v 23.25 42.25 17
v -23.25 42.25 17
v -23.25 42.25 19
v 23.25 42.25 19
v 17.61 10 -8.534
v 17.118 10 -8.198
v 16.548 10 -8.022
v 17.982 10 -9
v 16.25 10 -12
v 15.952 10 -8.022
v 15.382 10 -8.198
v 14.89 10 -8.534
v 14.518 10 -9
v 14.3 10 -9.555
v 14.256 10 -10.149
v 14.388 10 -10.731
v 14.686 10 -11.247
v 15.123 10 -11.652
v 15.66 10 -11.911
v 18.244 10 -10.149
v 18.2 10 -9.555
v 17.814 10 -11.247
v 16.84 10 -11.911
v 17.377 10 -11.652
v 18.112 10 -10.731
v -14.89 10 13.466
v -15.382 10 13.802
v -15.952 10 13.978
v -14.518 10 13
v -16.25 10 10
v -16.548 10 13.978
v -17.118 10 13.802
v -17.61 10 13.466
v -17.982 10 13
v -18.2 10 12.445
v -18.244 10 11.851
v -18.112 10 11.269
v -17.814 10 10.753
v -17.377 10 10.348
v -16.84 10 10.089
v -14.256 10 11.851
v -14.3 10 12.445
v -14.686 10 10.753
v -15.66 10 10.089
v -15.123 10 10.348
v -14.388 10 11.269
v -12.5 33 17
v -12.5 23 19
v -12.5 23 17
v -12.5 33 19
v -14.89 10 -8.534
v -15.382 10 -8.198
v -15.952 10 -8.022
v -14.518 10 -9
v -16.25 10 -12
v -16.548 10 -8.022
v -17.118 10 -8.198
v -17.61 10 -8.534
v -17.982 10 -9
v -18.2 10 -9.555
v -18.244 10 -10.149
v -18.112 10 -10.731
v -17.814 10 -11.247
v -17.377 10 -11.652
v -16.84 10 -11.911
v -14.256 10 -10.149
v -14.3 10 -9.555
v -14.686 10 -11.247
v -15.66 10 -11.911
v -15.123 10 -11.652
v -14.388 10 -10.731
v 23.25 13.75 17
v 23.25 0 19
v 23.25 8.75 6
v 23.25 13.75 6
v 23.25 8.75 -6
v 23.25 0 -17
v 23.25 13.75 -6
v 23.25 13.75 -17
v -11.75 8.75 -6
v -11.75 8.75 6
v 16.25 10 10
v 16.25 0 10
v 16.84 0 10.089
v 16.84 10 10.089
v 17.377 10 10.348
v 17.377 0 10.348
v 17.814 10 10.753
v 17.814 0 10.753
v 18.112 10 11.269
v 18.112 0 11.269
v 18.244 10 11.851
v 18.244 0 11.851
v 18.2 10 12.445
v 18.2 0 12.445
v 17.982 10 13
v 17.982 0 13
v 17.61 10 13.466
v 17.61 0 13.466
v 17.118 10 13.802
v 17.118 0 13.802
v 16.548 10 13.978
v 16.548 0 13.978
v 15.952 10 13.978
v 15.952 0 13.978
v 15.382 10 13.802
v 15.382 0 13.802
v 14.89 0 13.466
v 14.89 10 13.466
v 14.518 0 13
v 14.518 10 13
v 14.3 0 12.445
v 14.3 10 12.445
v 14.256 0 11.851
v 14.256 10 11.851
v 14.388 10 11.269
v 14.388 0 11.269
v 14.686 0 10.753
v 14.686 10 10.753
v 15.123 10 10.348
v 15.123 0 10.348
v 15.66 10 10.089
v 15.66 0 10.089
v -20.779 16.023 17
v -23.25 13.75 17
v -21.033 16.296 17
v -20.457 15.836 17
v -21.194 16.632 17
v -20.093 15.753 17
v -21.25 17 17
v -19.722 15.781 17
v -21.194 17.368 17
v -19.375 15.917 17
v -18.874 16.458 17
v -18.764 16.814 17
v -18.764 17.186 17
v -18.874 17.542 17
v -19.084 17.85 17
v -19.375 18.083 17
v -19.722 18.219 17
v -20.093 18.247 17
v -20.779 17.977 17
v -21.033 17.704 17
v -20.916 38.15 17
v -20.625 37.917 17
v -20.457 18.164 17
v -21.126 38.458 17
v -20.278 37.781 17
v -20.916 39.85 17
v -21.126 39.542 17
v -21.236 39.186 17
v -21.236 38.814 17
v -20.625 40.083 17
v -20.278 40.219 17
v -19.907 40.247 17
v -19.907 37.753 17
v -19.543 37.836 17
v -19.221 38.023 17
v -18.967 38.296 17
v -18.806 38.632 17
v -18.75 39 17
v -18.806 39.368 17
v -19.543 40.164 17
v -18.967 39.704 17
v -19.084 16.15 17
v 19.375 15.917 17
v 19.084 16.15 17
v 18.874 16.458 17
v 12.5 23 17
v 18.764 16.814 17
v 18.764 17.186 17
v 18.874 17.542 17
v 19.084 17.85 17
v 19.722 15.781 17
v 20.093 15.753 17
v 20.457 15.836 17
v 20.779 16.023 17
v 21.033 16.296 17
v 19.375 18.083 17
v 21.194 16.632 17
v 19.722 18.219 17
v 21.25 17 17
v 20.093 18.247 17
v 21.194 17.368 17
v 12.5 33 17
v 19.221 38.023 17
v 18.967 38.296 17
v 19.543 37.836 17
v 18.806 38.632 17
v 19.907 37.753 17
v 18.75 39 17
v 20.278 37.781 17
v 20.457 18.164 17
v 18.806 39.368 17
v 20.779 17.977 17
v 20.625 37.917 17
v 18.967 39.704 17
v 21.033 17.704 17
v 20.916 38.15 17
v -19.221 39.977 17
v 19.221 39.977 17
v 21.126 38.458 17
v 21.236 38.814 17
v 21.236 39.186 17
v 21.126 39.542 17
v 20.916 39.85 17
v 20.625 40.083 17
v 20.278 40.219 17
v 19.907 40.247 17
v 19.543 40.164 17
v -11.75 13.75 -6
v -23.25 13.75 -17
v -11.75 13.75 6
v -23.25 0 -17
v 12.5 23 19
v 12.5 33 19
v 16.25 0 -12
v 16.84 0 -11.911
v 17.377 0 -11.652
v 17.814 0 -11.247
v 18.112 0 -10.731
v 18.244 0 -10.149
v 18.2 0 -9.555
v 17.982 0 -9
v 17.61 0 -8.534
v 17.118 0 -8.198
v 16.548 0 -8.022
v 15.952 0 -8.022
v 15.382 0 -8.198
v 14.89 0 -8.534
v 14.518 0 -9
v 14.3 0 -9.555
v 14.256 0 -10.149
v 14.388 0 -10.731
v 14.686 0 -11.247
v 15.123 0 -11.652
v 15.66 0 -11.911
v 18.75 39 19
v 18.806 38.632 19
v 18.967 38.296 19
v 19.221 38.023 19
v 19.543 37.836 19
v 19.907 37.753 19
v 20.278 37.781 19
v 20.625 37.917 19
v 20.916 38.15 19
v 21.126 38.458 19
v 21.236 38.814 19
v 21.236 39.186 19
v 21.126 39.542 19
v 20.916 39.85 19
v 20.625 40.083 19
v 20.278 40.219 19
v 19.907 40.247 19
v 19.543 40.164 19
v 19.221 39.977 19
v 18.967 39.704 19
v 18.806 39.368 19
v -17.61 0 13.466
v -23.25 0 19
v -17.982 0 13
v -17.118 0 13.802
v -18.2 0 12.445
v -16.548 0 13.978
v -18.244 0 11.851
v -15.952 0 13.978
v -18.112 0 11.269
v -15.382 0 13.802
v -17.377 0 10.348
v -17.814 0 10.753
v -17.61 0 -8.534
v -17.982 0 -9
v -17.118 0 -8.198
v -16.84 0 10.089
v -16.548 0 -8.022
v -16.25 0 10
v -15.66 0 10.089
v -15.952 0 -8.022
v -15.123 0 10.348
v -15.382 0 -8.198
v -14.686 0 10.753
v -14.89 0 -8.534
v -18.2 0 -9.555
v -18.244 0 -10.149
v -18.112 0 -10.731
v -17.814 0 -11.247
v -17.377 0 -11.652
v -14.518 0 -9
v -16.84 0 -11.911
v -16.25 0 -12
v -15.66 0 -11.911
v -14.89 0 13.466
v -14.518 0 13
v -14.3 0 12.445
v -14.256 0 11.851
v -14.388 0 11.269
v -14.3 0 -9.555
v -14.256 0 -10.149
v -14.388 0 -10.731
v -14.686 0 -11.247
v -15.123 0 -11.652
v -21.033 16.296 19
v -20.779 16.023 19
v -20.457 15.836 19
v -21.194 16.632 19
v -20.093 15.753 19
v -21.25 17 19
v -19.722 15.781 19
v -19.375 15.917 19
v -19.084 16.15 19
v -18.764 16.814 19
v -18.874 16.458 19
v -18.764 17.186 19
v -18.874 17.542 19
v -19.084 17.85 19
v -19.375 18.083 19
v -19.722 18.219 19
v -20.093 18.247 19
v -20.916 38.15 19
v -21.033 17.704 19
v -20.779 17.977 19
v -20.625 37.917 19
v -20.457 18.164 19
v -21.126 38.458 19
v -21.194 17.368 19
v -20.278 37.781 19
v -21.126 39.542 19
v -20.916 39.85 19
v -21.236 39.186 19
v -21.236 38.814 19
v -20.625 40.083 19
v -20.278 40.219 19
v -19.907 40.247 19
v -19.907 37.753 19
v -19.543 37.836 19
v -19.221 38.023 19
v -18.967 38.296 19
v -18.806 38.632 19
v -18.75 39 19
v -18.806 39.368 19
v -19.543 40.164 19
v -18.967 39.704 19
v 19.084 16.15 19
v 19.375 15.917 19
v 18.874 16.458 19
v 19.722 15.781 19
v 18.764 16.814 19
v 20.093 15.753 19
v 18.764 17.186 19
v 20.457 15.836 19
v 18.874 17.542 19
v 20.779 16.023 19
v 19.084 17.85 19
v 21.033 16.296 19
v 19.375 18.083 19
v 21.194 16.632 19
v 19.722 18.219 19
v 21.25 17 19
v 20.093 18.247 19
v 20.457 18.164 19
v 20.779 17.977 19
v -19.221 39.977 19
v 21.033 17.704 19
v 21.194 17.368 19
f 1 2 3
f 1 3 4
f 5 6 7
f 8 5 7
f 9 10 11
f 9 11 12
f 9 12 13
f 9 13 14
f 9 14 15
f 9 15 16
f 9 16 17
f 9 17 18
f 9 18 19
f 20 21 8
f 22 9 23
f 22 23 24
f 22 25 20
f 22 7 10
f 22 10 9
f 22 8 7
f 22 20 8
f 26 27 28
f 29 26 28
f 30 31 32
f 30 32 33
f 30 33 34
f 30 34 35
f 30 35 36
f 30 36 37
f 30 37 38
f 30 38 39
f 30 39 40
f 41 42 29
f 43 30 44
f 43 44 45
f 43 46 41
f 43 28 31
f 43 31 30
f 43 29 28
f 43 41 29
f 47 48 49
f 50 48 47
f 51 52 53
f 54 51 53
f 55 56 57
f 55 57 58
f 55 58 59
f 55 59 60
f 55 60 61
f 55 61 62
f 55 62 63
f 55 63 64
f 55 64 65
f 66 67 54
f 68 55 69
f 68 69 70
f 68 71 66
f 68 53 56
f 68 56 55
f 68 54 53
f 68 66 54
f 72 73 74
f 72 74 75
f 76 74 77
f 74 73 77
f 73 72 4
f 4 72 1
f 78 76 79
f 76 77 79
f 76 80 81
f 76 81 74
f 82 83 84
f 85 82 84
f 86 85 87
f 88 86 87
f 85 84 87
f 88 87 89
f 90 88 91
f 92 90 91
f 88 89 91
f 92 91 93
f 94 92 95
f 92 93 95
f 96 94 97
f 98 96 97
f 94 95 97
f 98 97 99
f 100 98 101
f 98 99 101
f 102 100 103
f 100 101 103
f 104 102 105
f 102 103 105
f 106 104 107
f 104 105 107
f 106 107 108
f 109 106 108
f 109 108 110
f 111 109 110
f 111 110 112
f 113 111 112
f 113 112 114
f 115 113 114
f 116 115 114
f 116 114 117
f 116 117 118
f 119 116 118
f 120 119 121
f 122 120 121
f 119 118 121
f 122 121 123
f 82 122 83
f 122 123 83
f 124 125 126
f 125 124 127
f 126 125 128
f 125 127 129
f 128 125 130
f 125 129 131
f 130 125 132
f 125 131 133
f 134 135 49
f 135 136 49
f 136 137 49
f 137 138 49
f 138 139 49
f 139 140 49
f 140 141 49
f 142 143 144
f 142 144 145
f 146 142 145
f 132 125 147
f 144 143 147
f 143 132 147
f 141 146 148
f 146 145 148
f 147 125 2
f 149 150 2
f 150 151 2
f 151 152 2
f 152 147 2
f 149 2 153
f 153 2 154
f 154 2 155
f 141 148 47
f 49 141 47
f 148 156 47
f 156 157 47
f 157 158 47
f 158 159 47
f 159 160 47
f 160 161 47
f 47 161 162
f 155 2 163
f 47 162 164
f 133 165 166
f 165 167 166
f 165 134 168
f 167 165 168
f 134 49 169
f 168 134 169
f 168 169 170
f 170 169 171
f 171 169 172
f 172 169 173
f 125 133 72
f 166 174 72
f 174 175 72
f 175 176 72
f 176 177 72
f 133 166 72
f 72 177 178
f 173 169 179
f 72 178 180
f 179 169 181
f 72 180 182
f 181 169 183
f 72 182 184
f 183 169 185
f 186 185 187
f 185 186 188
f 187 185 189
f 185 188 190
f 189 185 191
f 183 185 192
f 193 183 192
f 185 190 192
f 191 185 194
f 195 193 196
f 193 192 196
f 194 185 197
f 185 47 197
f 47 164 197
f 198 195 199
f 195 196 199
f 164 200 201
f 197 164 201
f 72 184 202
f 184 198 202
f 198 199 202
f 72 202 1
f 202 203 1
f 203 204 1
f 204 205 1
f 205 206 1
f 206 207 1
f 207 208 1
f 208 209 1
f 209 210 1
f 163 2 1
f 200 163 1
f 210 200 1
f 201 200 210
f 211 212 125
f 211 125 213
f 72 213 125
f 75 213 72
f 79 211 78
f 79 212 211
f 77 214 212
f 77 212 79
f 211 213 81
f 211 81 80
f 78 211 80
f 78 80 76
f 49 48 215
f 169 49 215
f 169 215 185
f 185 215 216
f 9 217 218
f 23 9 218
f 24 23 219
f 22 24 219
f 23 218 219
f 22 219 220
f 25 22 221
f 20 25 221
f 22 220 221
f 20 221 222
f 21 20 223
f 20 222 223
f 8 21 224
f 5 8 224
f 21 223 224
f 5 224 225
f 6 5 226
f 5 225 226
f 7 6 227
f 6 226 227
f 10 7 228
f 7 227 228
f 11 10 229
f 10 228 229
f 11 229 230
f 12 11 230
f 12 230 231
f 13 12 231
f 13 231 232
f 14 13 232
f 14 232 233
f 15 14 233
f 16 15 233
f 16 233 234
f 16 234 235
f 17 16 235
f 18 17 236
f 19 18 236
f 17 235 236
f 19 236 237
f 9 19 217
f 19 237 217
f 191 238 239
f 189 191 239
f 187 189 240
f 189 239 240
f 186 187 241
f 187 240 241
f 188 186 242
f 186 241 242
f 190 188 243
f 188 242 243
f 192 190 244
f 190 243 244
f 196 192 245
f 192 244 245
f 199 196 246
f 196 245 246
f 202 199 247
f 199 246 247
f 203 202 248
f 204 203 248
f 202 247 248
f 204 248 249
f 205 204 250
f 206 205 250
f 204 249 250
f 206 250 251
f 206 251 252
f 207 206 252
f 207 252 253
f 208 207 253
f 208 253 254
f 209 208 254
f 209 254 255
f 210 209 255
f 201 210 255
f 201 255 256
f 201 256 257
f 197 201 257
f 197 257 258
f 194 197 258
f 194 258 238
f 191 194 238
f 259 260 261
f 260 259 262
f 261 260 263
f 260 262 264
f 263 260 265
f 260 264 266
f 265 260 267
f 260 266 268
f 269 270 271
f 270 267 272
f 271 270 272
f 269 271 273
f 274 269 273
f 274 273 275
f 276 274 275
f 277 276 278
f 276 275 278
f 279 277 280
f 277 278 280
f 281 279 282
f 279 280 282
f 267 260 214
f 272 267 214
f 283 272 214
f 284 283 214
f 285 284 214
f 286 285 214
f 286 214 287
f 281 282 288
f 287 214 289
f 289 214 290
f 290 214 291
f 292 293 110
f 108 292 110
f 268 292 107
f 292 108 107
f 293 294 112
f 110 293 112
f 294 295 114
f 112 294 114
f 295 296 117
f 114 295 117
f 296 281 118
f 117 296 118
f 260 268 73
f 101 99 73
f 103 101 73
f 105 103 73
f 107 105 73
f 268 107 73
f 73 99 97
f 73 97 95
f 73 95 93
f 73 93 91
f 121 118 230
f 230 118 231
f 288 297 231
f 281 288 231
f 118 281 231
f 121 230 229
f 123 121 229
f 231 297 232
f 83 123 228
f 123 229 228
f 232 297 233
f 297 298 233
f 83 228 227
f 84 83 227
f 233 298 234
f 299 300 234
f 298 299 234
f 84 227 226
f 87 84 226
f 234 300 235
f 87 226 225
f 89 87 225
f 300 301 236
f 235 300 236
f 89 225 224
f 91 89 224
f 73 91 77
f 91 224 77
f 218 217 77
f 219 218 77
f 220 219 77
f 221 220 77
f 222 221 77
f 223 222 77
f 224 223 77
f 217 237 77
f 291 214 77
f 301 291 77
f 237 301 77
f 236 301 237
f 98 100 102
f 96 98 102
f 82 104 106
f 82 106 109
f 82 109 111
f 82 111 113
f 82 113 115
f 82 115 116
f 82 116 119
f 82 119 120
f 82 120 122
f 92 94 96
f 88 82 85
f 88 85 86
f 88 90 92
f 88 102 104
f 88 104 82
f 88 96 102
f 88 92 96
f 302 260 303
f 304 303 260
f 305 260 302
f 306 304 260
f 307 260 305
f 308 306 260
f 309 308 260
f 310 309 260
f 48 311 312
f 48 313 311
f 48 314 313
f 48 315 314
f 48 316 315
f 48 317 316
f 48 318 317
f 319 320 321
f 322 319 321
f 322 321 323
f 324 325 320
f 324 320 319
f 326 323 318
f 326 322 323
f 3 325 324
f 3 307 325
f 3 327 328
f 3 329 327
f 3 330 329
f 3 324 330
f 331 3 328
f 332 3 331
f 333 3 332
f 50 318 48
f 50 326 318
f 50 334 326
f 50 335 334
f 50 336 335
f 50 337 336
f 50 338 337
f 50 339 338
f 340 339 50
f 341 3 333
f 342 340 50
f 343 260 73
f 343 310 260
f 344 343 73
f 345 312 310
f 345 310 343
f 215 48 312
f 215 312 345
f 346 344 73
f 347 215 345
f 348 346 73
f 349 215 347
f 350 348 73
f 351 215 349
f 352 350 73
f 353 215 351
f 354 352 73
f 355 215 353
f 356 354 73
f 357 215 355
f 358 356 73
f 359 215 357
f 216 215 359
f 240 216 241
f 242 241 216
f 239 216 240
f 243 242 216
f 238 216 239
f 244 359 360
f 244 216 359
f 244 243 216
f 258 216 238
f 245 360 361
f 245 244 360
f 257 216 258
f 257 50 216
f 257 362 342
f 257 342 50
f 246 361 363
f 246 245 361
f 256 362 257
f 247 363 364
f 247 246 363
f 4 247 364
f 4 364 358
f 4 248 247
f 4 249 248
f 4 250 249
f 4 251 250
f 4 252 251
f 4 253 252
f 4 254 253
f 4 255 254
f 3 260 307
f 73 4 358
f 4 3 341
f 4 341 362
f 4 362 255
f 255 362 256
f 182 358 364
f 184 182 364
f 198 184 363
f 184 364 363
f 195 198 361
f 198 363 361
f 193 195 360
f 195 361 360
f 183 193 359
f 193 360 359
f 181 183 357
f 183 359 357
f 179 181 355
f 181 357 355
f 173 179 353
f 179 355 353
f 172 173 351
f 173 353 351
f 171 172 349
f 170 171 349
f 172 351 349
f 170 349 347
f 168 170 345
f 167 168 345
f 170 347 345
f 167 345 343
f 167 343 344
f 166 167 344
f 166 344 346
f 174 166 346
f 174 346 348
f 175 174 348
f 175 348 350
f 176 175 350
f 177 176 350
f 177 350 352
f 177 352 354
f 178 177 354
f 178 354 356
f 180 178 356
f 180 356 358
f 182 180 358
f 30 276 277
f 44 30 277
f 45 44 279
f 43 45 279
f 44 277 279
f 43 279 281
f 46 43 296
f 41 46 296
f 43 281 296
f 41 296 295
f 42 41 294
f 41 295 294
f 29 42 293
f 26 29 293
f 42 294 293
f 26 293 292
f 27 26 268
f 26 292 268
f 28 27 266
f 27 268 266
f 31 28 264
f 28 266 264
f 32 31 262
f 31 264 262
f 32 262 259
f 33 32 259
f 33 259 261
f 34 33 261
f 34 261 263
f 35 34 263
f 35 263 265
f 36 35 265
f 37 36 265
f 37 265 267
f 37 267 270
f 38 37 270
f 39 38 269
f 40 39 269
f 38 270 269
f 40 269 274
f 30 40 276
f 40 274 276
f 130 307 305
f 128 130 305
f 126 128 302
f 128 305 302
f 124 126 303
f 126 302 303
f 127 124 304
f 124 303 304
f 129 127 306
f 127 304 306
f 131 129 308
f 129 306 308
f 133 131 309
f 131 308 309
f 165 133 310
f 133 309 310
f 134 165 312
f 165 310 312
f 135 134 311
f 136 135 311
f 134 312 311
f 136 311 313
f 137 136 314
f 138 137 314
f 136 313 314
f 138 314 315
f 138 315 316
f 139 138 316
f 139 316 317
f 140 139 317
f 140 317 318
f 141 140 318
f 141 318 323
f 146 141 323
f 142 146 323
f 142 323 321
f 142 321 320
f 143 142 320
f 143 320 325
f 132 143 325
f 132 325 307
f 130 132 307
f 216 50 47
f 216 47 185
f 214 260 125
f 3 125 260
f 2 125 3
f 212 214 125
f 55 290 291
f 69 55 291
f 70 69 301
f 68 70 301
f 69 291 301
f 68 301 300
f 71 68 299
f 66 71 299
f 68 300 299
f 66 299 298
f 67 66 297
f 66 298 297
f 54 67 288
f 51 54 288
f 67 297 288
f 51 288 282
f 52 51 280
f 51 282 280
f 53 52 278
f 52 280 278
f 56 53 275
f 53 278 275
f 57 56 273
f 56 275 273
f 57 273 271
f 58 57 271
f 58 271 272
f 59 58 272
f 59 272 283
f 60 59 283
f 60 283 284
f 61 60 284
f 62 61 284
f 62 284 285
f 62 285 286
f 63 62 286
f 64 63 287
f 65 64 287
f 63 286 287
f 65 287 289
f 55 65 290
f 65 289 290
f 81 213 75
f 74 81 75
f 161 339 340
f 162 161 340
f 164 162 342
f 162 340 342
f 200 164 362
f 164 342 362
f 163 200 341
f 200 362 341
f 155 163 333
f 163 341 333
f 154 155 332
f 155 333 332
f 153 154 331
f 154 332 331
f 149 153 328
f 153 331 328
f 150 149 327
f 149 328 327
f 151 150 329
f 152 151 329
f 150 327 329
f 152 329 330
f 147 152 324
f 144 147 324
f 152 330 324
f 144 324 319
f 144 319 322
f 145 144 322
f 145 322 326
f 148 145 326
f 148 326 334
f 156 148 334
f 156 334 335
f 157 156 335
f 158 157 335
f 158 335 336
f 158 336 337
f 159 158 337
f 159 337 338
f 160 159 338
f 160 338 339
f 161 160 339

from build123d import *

# Parameters (mm, degrees)
SKETCH1_W           = 46.5
SKETCH1_H           = 34
BOSS_EXTRUDE1_DEPTH = 13.75
SKETCH2_W           = 46.5
SKETCH2_H           = 42.25
BOSS_EXTRUDE2_DEPTH = 2
CUT_EXTRUDE1_REACH  = 62.18
SKETCH3_R           = 1.25
SKETCH3_W           = 25
SKETCH3_H           = 10
SKETCH4_W           = 35
SKETCH4_H           = 12
CUT_EXTRUDE2_DEPTH  = 5
SKETCH6_R           = 2
CUT_EXTRUDE3_DEPTH  = 10


with BuildPart() as part:
    # Sketch1 → Boss-Extrude1 (new body)
    with BuildSketch(Plane(origin=(0, 0, 0), x_dir=(1, 0, 0), z_dir=(0, 1, 0))):
        Rectangle(SKETCH1_W, SKETCH1_H)
    extrude(amount=BOSS_EXTRUDE1_DEPTH)

    # Sketch2 → Boss-Extrude2 (add)
    with BuildSketch(Plane.XY.offset(17)):
        with Locations((0, 21.125)):
            Rectangle(SKETCH2_W, SKETCH2_H)
    extrude(amount=BOSS_EXTRUDE2_DEPTH)

    # Sketch3 → Cut-Extrude1 (cut, up to next)
    with BuildSketch(Plane.XY.offset(19), mode=Mode.PRIVATE) as cut_extrude1_sk1:
        with Locations((-20, 39)):
            Circle(SKETCH3_R)
    cut_extrude1_tool1 = extrude(cut_extrude1_sk1.sketch, amount=-CUT_EXTRUDE1_REACH, mode=Mode.PRIVATE) & part.part
    # Sketch3 → Cut-Extrude1 (cut, up to next)
    with BuildSketch(Plane.XY.offset(19), mode=Mode.PRIVATE) as cut_extrude1_sk2:
        with Locations(Location((20, 39, 0), (0, 0, 180))):
            Circle(SKETCH3_R)
    cut_extrude1_tool2 = extrude(cut_extrude1_sk2.sketch, amount=-CUT_EXTRUDE1_REACH, mode=Mode.PRIVATE) & part.part
    # Sketch3 → Cut-Extrude1 (cut, up to next)
    with BuildSketch(Plane.XY.offset(19), mode=Mode.PRIVATE) as cut_extrude1_sk3:
        with Locations((20, 17)):
            Circle(SKETCH3_R)
    cut_extrude1_tool3 = extrude(cut_extrude1_sk3.sketch, amount=-CUT_EXTRUDE1_REACH, mode=Mode.PRIVATE) & part.part
    # Sketch3 → Cut-Extrude1 (cut, up to next)
    with BuildSketch(Plane.XY.offset(19), mode=Mode.PRIVATE) as cut_extrude1_sk4:
        with Locations(Location((-20, 17, 0), (0, 0, 180))):
            Circle(SKETCH3_R)
    cut_extrude1_tool4 = extrude(cut_extrude1_sk4.sketch, amount=-CUT_EXTRUDE1_REACH, mode=Mode.PRIVATE) & part.part
    # Sketch3 → Cut-Extrude1 (cut, up to next)
    with BuildSketch(Plane.XY.offset(19), mode=Mode.PRIVATE) as cut_extrude1_sk5:
        with Locations((0, 28)):
            Rectangle(SKETCH3_W, SKETCH3_H)
    cut_extrude1_tool5 = extrude(cut_extrude1_sk5.sketch, amount=-CUT_EXTRUDE1_REACH, mode=Mode.PRIVATE) & part.part
    add(cut_extrude1_tool1.solids().sort_by_distance((-20, 39, 19))[0], mode=Mode.SUBTRACT)
    add(cut_extrude1_tool2.solids().sort_by_distance((20, 39, 19))[0], mode=Mode.SUBTRACT)
    add(cut_extrude1_tool3.solids().sort_by_distance((20, 17, 19))[0], mode=Mode.SUBTRACT)
    add(cut_extrude1_tool4.solids().sort_by_distance((-20, 17, 19))[0], mode=Mode.SUBTRACT)
    add(cut_extrude1_tool5.solids().sort_by_distance((0, 28, 19))[0], mode=Mode.SUBTRACT)

    # Sketch4 → Cut-Extrude2 (cut)
    with BuildSketch(Plane(origin=(0, 13.75, 0), x_dir=(1, 0, 0), z_dir=(0, 1, 0))):
        with Locations((5.75, 0)):
            Rectangle(SKETCH4_W, SKETCH4_H)
    extrude(amount=-CUT_EXTRUDE2_DEPTH, mode=Mode.SUBTRACT)

    # Sketch6 → Cut-Extrude3 (cut)
    with BuildSketch(Plane.XZ):
        with Locations(Location((16.25, -10, 0), (0, 0, 270))):
            Circle(SKETCH6_R)
        with Locations(Location((16.25, 12, 0), (0, 0, 270))):
            Circle(SKETCH6_R)
        with Locations(Location((-16.25, -10, 0), (0, 0, 270))):
            Circle(SKETCH6_R)
        with Locations(Location((-16.25, 12, 0), (0, 0, 270))):
            Circle(SKETCH6_R)
    extrude(amount=-CUT_EXTRUDE3_DEPTH, mode=Mode.SUBTRACT)


solid = part.part
